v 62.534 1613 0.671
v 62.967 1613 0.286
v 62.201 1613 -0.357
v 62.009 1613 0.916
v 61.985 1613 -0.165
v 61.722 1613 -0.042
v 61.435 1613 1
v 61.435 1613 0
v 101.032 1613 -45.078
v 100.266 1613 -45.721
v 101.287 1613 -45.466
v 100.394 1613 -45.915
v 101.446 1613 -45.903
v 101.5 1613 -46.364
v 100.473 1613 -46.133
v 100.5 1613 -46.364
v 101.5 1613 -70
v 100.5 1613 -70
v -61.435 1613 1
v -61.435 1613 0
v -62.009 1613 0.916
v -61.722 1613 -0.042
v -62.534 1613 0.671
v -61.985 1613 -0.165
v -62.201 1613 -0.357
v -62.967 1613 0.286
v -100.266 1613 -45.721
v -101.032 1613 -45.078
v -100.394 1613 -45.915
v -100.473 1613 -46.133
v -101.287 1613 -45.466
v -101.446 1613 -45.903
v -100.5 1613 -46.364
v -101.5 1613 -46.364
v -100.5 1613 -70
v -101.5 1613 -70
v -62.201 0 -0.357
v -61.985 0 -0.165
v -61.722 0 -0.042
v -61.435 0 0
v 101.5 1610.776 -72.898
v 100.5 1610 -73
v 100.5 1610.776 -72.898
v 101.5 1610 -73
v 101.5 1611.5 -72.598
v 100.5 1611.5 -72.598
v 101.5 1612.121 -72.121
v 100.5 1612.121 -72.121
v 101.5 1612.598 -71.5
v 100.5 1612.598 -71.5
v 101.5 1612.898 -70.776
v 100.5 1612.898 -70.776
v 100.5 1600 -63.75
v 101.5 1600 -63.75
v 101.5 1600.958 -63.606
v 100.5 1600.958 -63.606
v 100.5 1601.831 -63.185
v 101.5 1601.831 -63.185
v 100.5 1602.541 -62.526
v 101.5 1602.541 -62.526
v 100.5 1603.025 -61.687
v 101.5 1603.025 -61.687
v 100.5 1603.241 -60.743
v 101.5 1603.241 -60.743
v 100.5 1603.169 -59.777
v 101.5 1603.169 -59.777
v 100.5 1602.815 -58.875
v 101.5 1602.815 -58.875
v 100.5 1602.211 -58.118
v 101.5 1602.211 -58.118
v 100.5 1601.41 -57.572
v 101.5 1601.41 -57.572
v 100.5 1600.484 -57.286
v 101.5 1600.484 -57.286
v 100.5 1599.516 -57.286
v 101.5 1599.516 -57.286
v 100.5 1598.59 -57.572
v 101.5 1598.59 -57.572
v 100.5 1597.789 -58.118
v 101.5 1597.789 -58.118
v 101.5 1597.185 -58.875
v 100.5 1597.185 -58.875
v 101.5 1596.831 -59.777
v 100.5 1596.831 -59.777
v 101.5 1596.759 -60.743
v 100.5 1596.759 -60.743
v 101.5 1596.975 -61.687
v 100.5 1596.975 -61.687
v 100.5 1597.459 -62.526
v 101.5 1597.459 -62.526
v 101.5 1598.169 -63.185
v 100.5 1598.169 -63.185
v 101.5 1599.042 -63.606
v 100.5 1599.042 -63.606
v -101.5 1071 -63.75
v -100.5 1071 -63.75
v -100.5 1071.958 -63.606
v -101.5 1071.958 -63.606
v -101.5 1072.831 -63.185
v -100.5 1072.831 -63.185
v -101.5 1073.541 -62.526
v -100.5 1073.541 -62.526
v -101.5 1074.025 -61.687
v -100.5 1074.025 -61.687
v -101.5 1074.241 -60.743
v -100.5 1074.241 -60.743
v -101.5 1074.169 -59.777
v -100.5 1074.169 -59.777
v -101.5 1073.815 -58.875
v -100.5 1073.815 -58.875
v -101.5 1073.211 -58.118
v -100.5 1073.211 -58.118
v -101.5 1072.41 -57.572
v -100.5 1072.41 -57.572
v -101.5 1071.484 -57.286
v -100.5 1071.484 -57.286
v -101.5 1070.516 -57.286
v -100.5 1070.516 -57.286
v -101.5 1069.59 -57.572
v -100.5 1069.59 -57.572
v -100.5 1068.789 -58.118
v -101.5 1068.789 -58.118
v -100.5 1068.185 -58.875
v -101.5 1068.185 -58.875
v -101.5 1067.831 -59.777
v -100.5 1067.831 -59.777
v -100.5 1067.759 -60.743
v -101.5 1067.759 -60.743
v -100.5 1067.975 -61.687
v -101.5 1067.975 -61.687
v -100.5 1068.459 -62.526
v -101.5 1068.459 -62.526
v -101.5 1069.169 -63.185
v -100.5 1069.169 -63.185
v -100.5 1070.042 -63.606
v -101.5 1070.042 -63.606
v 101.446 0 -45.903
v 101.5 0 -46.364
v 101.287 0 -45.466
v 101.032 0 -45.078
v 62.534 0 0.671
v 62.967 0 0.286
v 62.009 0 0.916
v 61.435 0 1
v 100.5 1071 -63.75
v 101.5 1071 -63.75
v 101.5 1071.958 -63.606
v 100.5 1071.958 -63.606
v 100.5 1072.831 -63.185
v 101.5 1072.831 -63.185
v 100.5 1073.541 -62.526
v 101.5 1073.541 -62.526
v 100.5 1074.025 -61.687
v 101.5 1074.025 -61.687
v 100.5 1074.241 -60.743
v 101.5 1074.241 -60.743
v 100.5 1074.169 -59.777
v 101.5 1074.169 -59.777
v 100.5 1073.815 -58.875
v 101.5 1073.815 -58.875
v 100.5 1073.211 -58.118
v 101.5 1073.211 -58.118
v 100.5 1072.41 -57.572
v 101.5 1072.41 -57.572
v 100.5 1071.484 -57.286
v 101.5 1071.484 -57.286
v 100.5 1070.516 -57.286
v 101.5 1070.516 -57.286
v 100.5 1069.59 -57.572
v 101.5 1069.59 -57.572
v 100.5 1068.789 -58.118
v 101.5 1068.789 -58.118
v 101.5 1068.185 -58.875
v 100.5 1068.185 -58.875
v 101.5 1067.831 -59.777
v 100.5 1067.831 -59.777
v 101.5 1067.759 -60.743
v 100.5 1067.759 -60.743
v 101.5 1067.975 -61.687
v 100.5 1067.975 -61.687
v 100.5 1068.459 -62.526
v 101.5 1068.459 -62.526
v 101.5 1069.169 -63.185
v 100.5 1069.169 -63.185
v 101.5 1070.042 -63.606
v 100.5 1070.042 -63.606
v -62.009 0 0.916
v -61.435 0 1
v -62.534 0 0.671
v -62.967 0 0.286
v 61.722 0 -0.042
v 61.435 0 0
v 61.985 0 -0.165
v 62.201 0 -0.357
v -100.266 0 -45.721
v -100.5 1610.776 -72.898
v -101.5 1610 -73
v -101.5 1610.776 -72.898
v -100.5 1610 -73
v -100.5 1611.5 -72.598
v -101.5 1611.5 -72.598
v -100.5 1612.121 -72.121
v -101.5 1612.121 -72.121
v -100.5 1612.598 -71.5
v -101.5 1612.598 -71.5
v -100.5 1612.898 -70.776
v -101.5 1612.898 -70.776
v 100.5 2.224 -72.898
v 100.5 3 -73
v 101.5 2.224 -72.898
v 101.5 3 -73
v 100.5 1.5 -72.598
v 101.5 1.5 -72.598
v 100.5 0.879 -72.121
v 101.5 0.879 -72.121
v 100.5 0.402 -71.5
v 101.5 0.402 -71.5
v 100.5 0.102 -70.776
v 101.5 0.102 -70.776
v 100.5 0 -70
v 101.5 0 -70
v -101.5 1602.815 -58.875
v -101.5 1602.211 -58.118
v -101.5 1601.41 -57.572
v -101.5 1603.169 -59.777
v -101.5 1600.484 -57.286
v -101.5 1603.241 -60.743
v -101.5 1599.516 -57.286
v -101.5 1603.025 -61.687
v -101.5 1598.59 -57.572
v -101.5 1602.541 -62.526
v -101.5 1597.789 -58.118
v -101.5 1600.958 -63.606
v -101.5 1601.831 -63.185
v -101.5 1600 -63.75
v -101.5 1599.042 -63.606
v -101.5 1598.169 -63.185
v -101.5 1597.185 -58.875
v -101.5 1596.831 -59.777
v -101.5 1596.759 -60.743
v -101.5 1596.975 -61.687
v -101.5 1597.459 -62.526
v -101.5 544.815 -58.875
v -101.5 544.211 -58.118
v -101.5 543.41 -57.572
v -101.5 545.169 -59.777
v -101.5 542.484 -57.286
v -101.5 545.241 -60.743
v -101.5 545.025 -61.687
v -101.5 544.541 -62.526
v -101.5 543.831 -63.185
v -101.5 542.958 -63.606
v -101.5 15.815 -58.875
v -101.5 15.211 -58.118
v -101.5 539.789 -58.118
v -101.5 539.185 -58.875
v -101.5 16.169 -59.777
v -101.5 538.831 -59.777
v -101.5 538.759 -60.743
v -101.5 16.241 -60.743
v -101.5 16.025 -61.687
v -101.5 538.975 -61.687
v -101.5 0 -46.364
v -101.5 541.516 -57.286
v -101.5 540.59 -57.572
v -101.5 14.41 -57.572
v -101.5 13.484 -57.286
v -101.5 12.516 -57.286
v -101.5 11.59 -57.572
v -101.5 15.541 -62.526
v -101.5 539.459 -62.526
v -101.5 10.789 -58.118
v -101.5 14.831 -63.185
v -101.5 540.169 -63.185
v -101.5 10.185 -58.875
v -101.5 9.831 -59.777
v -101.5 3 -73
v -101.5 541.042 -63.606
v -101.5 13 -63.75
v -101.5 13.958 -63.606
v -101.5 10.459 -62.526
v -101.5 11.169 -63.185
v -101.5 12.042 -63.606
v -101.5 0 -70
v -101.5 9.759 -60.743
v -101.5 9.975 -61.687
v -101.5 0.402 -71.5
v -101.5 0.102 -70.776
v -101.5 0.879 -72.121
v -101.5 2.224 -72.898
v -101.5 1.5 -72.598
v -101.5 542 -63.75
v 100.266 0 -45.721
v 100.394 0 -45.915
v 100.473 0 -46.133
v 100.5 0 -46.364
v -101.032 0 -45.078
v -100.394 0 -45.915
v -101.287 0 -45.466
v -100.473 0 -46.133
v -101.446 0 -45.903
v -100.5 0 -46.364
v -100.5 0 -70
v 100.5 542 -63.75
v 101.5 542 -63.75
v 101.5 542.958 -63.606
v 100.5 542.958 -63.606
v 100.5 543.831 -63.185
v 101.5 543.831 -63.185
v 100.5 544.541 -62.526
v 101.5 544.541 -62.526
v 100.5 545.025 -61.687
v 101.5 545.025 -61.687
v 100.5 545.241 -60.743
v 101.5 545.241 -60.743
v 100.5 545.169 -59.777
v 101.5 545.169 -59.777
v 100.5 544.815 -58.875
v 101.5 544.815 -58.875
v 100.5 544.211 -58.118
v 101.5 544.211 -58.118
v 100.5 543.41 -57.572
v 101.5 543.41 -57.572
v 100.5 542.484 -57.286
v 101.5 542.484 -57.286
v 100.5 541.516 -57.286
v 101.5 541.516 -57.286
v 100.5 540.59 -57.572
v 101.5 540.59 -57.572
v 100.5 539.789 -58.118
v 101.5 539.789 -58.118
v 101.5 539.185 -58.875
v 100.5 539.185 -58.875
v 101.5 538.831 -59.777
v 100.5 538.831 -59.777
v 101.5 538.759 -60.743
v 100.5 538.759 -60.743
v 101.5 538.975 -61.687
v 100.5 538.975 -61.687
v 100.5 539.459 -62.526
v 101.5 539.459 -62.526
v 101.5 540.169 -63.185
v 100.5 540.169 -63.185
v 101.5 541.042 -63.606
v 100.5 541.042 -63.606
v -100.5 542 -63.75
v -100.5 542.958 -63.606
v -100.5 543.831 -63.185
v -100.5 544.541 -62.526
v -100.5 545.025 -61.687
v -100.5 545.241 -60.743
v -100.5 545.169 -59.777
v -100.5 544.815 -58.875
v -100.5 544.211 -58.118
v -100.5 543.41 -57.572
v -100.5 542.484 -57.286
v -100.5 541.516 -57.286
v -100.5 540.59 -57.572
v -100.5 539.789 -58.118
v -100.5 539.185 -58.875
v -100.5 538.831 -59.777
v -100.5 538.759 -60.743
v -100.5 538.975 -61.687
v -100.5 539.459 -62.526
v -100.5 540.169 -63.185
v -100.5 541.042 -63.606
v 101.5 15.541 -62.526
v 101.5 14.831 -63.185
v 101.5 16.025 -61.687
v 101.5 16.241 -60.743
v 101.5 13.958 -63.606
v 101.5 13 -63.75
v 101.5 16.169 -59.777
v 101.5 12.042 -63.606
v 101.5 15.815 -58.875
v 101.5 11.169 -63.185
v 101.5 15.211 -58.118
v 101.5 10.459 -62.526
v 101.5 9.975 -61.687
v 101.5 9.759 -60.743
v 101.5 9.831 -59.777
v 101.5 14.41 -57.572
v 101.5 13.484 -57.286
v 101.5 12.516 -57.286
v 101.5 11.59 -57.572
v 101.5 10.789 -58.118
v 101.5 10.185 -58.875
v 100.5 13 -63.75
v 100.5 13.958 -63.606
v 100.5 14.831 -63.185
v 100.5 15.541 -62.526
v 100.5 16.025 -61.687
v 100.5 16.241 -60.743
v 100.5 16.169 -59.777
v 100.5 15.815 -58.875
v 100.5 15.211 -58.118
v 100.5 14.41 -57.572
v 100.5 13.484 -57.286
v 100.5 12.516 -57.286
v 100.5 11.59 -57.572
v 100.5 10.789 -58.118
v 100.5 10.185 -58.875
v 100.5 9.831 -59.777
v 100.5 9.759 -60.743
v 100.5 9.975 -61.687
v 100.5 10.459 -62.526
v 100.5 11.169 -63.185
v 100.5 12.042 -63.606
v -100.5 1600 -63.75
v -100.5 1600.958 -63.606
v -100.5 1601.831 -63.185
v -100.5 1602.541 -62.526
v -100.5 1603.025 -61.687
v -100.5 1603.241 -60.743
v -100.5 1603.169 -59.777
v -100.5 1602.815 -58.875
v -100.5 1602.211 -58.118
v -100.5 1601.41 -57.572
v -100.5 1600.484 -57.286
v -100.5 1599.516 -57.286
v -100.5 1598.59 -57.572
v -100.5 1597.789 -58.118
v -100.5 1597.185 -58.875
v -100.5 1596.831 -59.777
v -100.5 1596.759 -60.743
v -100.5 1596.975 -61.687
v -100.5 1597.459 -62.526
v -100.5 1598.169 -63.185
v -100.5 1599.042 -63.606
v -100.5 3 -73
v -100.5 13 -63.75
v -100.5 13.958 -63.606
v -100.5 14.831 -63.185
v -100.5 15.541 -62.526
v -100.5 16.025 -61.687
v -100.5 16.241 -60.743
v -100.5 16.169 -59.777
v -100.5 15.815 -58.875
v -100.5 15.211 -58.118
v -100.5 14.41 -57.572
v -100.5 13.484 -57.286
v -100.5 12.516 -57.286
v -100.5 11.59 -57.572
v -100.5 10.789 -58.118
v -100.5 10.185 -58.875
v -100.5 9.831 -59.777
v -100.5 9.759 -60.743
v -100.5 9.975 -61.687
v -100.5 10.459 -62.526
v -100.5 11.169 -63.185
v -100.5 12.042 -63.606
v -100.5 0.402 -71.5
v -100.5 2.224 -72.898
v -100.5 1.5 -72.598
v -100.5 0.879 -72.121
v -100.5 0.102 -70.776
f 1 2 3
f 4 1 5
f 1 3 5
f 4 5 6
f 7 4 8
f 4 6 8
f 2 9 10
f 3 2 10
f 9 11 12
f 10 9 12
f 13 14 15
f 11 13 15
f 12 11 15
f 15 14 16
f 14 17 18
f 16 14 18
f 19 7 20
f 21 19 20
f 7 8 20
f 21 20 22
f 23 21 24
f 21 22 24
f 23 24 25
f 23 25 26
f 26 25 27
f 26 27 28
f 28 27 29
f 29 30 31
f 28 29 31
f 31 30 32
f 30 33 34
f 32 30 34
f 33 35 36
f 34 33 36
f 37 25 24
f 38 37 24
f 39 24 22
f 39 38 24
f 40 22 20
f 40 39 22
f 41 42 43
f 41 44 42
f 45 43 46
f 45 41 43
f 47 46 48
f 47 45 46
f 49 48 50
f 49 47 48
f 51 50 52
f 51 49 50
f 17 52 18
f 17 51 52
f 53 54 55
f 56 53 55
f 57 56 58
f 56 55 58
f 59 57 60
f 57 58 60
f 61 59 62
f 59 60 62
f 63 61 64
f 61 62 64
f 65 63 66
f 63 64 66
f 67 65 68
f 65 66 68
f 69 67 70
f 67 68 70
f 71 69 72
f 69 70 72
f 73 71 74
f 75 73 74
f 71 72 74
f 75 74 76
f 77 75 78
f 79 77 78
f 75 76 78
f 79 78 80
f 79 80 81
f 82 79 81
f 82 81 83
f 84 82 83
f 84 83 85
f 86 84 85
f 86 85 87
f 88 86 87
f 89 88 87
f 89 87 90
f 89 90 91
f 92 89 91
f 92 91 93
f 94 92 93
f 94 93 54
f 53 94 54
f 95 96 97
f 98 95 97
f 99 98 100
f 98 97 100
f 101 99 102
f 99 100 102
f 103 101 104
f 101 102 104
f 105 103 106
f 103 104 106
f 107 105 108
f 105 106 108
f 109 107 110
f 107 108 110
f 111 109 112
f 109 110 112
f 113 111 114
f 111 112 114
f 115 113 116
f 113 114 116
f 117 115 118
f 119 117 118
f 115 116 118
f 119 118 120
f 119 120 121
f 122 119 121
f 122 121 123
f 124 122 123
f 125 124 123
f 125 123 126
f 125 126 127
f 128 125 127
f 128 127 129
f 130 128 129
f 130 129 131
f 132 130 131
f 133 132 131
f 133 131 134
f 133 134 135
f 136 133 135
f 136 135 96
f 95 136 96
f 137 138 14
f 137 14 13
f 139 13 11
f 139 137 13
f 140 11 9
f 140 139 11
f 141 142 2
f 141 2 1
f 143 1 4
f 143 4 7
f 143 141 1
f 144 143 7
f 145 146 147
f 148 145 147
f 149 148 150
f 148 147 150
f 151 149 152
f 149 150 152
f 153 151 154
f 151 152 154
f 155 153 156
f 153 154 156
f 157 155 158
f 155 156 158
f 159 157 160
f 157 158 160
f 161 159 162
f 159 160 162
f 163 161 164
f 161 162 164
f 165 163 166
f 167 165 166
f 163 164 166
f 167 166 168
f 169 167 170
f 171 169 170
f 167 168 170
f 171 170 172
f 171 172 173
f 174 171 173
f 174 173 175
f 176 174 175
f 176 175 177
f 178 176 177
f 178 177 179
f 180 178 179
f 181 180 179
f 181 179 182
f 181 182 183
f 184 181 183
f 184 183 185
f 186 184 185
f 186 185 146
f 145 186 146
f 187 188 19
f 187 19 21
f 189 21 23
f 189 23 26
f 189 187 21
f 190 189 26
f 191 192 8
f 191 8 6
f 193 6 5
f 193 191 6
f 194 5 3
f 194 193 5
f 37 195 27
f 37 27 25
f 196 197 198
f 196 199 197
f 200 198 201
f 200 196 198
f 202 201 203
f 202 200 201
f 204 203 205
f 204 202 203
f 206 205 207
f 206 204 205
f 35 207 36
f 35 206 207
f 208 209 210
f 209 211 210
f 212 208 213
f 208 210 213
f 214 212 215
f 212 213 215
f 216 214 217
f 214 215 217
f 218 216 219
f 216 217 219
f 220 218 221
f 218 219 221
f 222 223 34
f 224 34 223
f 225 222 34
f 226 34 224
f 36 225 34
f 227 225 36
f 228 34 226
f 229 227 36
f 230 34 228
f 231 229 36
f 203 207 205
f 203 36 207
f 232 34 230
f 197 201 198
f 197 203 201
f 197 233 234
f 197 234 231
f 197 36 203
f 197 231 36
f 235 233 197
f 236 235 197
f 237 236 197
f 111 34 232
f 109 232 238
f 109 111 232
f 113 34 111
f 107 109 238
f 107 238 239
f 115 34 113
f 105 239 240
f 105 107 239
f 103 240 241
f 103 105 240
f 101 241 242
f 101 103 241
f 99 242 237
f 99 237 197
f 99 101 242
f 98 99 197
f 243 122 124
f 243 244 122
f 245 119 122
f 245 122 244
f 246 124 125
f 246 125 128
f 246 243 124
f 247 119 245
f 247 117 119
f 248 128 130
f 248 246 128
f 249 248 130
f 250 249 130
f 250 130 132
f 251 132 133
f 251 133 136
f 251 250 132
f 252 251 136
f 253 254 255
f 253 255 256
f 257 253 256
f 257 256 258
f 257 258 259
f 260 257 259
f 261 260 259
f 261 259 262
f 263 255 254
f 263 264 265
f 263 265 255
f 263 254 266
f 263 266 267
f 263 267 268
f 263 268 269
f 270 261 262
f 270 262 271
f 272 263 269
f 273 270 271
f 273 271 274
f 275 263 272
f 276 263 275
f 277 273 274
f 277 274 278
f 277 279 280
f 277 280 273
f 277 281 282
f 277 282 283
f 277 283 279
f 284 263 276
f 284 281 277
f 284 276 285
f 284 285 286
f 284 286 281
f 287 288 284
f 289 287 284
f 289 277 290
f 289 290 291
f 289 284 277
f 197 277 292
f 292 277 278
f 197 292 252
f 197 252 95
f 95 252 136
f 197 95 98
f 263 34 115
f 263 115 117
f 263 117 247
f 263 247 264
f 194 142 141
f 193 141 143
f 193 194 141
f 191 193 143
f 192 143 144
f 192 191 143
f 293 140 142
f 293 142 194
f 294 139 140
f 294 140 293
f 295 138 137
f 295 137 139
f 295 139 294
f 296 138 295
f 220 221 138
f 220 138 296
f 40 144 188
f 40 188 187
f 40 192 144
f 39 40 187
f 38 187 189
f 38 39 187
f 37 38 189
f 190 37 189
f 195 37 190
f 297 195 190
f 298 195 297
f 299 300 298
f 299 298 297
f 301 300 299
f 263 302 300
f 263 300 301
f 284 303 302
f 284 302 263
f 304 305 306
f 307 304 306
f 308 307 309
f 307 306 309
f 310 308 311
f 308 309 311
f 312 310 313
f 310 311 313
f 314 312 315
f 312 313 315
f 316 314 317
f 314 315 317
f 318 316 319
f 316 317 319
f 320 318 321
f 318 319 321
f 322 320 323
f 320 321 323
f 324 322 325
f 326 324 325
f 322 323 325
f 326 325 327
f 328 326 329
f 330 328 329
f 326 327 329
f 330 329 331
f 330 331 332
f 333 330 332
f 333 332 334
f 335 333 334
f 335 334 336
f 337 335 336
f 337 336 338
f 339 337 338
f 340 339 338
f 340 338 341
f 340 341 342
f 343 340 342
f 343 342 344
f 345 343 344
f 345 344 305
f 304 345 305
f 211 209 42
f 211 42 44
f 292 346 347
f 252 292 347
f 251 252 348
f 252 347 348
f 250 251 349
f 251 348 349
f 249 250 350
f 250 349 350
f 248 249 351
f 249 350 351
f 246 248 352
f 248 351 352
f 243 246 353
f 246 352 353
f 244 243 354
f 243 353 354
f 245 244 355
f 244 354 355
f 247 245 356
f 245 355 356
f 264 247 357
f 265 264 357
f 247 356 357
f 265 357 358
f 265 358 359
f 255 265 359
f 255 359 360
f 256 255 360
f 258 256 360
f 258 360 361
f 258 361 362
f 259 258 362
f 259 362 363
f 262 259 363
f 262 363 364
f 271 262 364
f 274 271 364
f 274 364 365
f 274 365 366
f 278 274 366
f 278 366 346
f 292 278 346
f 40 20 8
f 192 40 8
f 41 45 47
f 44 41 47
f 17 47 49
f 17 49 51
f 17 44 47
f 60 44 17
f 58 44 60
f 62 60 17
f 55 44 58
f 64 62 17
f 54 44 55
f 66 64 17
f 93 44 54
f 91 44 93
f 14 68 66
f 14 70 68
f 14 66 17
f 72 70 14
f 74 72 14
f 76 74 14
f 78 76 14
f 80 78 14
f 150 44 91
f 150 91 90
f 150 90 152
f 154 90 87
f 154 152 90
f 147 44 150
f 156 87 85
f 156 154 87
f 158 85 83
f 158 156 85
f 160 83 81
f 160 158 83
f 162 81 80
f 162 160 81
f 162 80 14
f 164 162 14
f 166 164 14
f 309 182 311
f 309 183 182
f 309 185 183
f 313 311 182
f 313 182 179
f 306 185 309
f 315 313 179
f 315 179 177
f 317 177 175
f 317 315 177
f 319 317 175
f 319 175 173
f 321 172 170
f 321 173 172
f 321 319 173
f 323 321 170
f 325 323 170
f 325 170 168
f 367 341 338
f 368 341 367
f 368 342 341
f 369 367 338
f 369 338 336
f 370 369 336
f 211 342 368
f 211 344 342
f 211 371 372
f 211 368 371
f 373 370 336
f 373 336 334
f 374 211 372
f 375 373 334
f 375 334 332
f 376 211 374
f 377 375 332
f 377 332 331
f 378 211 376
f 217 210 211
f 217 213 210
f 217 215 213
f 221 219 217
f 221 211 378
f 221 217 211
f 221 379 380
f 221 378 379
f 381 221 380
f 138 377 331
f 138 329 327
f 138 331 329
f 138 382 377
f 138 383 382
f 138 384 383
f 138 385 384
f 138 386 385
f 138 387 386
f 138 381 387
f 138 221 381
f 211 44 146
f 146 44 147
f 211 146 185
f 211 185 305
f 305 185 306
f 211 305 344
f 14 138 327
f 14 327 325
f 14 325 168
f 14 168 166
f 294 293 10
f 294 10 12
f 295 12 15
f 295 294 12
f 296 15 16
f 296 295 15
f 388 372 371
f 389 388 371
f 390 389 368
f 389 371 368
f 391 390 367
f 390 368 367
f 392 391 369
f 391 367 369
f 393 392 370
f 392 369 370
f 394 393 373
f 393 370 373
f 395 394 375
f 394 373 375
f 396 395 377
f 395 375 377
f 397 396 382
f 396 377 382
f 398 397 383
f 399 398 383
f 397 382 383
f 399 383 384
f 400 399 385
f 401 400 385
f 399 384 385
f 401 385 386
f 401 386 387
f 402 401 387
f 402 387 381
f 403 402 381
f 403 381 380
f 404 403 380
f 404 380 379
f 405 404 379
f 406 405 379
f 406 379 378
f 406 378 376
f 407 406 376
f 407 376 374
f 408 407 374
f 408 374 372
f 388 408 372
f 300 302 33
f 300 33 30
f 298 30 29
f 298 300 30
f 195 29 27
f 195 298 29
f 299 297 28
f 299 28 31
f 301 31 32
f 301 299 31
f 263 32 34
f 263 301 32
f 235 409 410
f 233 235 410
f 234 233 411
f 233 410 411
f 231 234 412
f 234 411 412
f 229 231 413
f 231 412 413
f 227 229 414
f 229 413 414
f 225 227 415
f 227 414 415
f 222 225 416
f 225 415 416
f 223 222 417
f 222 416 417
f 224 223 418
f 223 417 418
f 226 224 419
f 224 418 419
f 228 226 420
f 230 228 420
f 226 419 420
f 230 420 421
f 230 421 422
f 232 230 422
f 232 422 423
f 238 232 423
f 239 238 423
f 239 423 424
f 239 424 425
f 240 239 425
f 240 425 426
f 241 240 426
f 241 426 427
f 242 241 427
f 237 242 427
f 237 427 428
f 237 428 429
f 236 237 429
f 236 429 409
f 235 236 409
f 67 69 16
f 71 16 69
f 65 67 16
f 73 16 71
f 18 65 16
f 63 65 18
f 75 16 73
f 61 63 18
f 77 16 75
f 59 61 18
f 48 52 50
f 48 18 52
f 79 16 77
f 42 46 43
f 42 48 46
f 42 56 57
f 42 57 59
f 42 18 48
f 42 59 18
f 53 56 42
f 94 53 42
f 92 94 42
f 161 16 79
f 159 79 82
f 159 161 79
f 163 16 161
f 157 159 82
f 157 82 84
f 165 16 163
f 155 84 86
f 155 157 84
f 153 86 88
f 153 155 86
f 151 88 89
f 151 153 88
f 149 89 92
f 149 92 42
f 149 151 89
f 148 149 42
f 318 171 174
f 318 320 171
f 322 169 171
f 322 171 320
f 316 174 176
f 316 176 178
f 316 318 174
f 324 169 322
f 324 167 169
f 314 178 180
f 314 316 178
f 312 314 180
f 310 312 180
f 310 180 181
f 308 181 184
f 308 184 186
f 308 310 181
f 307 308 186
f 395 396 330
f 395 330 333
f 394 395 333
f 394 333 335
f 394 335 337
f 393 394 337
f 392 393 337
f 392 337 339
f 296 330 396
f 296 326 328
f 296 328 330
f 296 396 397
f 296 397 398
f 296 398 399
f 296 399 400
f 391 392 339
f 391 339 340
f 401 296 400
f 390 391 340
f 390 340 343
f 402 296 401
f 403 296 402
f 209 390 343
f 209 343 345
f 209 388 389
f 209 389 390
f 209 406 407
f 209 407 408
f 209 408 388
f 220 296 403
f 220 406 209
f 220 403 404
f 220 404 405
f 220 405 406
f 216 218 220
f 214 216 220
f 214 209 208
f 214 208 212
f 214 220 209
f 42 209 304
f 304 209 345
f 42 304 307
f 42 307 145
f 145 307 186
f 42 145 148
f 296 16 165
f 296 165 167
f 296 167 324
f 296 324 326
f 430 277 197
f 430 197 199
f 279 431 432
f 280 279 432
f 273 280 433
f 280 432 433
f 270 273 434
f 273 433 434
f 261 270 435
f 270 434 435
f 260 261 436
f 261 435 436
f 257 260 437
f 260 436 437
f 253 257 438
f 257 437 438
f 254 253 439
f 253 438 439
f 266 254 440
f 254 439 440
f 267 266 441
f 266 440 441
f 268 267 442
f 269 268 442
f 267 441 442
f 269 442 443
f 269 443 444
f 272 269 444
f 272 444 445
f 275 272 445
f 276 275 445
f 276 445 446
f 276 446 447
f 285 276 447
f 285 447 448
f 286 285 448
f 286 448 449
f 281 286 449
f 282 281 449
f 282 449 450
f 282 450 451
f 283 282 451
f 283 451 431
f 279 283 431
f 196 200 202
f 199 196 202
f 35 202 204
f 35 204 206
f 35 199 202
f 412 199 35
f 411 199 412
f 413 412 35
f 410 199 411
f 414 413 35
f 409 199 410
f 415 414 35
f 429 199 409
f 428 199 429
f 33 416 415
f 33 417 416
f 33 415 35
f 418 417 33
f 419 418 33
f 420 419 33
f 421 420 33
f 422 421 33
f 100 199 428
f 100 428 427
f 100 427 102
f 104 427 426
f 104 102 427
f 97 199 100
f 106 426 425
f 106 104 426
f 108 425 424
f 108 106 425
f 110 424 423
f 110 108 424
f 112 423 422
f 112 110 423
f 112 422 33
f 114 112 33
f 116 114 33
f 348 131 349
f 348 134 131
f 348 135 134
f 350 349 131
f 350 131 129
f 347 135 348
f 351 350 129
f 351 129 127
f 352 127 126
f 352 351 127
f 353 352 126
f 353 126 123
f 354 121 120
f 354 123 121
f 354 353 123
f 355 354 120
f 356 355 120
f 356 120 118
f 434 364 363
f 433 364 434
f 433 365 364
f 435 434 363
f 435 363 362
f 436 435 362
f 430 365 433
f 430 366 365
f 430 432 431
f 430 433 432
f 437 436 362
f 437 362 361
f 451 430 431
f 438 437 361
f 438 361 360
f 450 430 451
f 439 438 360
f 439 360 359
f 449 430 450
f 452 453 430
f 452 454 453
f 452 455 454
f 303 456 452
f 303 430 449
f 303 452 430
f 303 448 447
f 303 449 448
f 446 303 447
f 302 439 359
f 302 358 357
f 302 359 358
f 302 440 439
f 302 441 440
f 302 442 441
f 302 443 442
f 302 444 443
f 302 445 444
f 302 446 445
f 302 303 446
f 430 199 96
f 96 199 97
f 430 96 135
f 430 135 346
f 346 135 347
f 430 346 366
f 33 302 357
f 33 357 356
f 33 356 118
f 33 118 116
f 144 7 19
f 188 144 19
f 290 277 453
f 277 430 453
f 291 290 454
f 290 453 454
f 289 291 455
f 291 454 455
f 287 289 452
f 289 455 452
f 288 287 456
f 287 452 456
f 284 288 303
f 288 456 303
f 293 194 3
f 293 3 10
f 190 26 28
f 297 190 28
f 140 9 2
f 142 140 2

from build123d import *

# Parameters (mm, degrees)
BASE_FLANGE1_DEPTH = 1613
FILLET1_R          = 3
CUT_EXTRUDE4_REACH = 1629.362
SKETCH10_R         = 3.25
LPATTERN5_COUNT    = 4
LPATTERN5_PITCH    = 529


# Sheet-metal steps are written as plain solids
with BuildPart() as part:
    # Sketch1 → Base-Flange1 (new body)
    with BuildSketch(Plane(origin=(0, 0, 0), x_dir=(1, 0, 0), z_dir=(0, 1, 0))):
        with BuildLine():
            Line((-100.5, 73), (-100.5, 46.363970234))
            ThreePointArc((-100.5, 46.363970234), (-100.439692621, 46.021950091), (-100.266044443, 45.721182625))
            Line((-100.266044443, 45.721182625), (-62.201153751, 0.35721239))
            ThreePointArc((-62.201153751, 0.35721239), (-61.857727569, 0.093692213), (-61.435109308, 0))
            Line((-61.435109308, 0), (61.435109308, 0))
            ThreePointArc((61.435109308, 0), (61.857727569, 0.093692213), (62.201153751, 0.35721239))
            Line((62.201153751, 0.35721239), (100.266044443, 45.721182625))
            ThreePointArc((100.266044443, 45.721182625), (100.439692621, 46.021950091), (100.5, 46.363970234))
            Line((100.5, 46.363970234), (100.5, 73))
            Line((100.5, 73), (101.5, 73))
            Line((101.5, 73), (101.5, 46.363970234))
            ThreePointArc((101.5, 46.363970234), (101.379385242, 45.679929948), (101.032088886, 45.078395015))
            Line((101.032088886, 45.078395015), (62.967198194, -0.285575219))
            ThreePointArc((62.967198194, -0.285575219), (62.280345831, -0.812615574), (61.435109308, -1))
            Line((61.435109308, -1), (-61.435109308, -1))
            ThreePointArc((-61.435109308, -1), (-62.280345831, -0.812615574), (-62.967198194, -0.285575219))
            Line((-62.967198194, -0.285575219), (-101.032088886, 45.078395015))
            ThreePointArc((-101.032088886, 45.078395015), (-101.379385242, 45.679929948), (-101.5, 46.363970234))
            Line((-101.5, 46.363970234), (-101.5, 73))
            Line((-101.5, 73), (-100.5, 73))
        make_face()
    extrude(amount=BASE_FLANGE1_DEPTH)

    # Fillet1
    fillet1_edges = [part.edges().sort_by_distance(p)[0] for p in [
        (-101, 0, -73),
        (101, 0, -73),
        (-101, 1613, -73),
        (101, 1613, -73),
    ]]
    fillet(fillet1_edges, radius=FILLET1_R)

    # Cut-Extrude4: up to this face of the body (flat: up to its plane)
    cut_extrude4_end = Plane(part.part.faces().sort_by_distance((-101.5, 806.5, -59.680847857))[0])
    # Sketch10 → Cut-Extrude4 (cut, up to the picked face)
    with BuildSketch(Plane(origin=(101.5, 0, 0), x_dir=(0, 0, -1), z_dir=(1, 0, 0)), mode=Mode.PRIVATE) as cut_extrude4_sk1:
        with Locations((60.5, 13)):
            Circle(SKETCH10_R)
    cut_extrude4_tool1 = split(extrude(cut_extrude4_sk1.sketch, amount=-CUT_EXTRUDE4_REACH, mode=Mode.PRIVATE), bisect_by=cut_extrude4_end, keep=Keep.BOTH, mode=Mode.PRIVATE)
    cut_extrude4 = cut_extrude4_tool1.solids().sort_by(Axis((101.5, 13, -60.5), (-1, 0, 0)))[0]
    add(cut_extrude4, mode=Mode.SUBTRACT)

    # LPattern5: Cut-Extrude4 ×4
    with Locations(*[(0, i * LPATTERN5_PITCH, 0) for i in range(1, LPATTERN5_COUNT)]):
        add(cut_extrude4, mode=Mode.SUBTRACT)


solid = part.part
